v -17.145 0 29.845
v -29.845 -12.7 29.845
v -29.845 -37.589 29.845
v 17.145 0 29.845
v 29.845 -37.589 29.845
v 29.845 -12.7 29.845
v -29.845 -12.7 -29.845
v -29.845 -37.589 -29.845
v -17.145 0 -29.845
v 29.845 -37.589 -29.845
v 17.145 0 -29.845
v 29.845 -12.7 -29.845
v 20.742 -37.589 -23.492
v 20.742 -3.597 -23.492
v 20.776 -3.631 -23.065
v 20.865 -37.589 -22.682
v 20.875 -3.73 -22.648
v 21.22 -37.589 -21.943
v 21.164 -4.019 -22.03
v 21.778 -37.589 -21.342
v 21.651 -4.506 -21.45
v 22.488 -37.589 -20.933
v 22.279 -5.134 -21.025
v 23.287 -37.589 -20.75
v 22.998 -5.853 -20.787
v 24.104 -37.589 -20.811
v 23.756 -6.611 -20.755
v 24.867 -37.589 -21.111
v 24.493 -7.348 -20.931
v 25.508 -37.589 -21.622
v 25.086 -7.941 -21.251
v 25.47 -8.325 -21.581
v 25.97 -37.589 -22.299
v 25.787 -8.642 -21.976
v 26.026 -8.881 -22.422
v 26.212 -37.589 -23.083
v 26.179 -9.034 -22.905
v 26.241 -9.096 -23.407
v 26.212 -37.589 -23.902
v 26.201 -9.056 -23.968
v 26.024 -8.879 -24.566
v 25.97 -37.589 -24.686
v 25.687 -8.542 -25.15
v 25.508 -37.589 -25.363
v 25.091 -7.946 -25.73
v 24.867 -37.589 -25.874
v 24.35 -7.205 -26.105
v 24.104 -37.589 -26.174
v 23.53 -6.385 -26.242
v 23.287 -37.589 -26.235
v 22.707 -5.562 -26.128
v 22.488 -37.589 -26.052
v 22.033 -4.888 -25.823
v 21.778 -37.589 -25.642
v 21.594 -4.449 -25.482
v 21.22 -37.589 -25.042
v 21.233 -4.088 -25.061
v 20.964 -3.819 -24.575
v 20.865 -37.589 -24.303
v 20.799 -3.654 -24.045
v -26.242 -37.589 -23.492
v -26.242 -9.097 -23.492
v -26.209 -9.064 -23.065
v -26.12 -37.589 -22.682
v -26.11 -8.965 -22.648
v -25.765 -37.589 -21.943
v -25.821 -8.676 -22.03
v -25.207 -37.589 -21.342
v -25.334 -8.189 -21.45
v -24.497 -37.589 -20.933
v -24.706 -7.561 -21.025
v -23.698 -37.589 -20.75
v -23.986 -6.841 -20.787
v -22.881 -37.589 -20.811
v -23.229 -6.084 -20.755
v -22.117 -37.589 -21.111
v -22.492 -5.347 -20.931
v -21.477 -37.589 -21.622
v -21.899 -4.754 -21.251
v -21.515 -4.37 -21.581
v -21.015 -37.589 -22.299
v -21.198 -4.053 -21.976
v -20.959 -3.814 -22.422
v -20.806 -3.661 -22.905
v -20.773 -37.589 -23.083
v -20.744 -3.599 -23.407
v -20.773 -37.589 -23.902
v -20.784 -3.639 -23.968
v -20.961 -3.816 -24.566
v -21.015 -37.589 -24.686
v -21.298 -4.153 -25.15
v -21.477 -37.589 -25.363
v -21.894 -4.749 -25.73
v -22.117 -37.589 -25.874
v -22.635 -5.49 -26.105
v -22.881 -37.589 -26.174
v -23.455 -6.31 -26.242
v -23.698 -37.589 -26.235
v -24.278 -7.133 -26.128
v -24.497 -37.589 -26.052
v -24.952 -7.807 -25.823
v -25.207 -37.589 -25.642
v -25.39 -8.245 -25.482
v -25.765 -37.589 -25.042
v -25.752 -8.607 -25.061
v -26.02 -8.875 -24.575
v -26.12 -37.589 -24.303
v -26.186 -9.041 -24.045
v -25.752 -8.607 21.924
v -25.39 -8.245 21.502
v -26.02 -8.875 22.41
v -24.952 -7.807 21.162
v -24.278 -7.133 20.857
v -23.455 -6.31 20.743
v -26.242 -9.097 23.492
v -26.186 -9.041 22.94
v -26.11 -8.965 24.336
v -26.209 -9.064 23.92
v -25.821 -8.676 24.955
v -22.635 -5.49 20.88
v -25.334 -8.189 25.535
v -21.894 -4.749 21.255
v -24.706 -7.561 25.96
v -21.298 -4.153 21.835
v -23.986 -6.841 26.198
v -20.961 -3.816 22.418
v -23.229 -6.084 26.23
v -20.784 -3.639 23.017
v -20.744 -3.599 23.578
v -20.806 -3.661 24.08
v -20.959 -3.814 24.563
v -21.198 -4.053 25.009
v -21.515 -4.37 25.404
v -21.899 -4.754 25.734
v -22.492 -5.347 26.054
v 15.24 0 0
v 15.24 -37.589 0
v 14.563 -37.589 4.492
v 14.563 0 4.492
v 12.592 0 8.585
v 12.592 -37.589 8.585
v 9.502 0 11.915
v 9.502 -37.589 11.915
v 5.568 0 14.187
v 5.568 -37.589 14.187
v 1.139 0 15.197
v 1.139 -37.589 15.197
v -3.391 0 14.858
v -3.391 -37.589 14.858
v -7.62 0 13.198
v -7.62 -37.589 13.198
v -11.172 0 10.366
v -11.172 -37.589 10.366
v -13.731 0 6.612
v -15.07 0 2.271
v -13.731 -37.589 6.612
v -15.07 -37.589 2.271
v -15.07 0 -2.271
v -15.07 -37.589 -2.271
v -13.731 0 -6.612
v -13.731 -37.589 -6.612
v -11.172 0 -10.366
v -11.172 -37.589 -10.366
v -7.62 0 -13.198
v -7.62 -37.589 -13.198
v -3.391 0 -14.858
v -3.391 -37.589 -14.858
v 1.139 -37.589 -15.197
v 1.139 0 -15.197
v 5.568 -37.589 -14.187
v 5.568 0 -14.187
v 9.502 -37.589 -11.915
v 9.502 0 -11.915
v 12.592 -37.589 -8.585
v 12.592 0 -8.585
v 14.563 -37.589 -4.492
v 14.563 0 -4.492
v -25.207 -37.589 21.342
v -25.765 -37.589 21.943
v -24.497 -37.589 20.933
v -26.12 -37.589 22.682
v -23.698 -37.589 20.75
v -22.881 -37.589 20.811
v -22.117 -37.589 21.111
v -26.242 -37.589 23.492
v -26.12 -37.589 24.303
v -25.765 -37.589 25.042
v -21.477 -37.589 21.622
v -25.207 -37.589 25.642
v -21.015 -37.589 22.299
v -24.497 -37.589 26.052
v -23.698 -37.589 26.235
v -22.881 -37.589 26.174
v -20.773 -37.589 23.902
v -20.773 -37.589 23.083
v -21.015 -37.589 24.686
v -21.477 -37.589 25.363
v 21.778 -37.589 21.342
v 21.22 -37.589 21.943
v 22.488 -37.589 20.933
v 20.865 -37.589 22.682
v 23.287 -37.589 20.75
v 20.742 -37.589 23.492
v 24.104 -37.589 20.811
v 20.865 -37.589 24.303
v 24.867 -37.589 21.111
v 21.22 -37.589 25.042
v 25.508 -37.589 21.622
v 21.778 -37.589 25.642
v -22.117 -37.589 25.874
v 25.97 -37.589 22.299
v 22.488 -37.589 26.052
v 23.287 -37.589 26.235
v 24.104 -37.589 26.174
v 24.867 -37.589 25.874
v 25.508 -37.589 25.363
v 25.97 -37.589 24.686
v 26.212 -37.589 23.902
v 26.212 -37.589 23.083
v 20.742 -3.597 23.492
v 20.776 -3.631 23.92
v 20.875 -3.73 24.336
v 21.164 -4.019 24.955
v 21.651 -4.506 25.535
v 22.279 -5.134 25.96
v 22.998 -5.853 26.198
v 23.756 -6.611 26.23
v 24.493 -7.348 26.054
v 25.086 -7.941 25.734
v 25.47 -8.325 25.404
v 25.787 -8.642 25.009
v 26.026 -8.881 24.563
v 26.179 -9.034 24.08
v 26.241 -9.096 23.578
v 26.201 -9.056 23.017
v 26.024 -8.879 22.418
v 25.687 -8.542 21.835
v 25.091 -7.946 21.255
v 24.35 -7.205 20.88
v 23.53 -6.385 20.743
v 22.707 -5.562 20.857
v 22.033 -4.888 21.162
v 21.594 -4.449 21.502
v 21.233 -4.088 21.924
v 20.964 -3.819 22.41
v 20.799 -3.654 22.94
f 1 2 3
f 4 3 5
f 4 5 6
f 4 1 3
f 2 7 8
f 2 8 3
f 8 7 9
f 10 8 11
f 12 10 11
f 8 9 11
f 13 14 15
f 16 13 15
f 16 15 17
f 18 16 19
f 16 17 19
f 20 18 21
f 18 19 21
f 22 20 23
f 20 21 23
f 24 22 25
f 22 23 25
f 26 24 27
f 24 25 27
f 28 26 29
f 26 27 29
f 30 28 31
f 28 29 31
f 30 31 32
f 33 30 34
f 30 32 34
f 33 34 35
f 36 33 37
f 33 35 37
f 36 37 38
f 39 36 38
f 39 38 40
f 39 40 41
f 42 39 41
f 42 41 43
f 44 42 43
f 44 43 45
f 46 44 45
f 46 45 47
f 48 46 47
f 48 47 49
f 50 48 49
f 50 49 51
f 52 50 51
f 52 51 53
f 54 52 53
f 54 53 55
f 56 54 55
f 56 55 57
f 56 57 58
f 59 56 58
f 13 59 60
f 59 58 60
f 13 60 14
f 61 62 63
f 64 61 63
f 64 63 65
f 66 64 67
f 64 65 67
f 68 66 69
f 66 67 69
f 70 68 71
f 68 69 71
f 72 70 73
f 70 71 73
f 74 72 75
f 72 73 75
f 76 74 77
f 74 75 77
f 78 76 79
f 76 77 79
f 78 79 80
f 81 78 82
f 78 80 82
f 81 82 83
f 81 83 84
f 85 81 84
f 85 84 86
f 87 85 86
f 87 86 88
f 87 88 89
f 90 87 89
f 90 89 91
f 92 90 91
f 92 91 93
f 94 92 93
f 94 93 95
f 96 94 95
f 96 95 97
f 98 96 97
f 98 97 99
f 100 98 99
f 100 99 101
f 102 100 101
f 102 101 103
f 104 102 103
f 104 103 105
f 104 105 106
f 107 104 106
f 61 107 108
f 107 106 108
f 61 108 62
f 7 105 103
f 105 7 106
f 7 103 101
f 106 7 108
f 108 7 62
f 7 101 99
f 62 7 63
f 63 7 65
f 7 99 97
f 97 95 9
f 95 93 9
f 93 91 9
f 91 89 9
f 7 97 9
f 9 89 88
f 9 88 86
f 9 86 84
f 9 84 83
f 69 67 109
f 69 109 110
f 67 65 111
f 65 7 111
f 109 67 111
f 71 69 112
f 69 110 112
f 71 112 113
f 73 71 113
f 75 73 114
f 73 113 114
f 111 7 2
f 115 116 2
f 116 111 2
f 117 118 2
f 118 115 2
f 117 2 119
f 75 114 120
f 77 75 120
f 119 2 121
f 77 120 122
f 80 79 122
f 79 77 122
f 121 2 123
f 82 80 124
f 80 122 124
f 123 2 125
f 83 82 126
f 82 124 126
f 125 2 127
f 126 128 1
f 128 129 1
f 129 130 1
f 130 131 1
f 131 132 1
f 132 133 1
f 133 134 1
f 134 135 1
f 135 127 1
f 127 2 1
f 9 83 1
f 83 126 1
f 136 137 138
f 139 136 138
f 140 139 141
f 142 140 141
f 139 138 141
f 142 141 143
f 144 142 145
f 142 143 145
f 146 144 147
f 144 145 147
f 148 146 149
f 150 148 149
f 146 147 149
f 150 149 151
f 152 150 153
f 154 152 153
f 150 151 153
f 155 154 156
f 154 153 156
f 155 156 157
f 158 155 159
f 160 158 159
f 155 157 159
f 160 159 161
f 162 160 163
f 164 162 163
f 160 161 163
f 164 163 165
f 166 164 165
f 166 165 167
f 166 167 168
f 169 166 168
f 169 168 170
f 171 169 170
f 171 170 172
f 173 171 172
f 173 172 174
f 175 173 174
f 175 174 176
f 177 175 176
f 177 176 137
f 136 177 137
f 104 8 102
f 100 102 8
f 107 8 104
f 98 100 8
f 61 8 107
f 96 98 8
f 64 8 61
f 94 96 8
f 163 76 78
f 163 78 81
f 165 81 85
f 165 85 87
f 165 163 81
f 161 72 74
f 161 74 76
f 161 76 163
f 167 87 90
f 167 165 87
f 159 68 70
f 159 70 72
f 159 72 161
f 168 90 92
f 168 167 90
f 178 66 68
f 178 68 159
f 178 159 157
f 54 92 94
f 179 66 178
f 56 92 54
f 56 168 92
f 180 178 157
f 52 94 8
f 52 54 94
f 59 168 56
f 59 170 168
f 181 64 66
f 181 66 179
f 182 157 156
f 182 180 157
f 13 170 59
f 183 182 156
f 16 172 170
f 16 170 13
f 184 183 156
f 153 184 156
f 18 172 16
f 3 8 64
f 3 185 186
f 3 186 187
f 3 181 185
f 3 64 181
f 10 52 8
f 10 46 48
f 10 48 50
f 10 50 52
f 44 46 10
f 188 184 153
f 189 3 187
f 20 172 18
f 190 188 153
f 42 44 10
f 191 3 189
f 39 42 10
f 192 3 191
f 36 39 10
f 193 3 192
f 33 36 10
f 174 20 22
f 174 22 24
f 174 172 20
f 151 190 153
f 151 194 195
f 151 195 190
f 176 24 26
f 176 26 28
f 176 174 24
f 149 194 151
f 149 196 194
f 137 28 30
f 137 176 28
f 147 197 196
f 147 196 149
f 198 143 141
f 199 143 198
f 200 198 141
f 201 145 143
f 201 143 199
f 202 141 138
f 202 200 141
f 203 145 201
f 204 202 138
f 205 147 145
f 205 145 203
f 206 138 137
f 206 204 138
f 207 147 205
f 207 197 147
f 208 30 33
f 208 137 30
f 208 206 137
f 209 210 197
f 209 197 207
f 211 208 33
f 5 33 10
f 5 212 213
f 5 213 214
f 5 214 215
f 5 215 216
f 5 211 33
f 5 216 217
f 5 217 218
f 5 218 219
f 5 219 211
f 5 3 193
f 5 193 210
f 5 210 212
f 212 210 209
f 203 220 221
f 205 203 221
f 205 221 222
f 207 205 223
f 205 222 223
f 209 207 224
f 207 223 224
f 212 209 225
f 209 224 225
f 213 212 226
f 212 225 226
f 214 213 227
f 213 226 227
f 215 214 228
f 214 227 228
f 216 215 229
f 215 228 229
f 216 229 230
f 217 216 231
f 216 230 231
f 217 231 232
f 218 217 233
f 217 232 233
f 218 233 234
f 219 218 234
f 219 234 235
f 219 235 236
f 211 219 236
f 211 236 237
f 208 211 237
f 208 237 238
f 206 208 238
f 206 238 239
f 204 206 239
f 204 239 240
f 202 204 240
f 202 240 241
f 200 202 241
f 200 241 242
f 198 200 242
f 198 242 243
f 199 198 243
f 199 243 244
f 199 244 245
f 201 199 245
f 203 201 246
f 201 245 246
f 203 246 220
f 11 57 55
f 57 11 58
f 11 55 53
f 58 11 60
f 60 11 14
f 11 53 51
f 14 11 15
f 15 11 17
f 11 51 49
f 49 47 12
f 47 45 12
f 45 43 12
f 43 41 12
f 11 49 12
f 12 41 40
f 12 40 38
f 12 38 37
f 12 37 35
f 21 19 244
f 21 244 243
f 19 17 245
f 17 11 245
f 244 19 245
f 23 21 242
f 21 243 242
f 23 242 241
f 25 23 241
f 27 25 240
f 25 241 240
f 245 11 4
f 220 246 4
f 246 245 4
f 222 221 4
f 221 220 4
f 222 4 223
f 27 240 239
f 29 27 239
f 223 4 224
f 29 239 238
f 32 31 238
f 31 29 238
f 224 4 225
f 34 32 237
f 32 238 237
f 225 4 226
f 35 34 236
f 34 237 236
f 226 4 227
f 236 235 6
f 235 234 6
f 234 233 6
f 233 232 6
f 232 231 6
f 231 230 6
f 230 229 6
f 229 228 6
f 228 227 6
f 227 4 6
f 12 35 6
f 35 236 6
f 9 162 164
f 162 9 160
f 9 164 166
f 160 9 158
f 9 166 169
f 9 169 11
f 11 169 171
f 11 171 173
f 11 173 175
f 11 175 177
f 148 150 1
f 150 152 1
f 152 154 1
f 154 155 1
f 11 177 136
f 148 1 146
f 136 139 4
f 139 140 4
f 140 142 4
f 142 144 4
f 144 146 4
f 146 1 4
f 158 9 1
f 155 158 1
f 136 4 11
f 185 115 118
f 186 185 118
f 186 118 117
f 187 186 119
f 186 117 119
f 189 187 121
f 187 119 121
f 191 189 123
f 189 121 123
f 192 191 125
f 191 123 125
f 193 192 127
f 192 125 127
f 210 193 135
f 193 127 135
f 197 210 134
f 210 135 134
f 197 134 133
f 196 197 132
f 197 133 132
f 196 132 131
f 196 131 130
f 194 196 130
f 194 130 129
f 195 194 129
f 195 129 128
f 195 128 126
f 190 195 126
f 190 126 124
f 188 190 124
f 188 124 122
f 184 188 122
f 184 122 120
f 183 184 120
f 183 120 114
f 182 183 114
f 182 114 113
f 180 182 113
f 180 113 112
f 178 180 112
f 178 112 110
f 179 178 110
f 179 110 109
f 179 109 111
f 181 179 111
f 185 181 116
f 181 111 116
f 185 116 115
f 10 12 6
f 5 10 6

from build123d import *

# Parameters (mm, degrees)
F0_W     = 59.69
F0_H     = 59.69
F1_DEPTH = 37.58946
F2_R     = 15.24
F3_DEPTH = 37.59046
F5_DEPTH = 59.691
F7_D     = 5.5


with BuildPart() as f1:
    # F0 (on Front) → F1 (new body)
    with BuildSketch(Plane.XZ):
        Rectangle(F0_W, F0_H)
    extrude(amount=F1_DEPTH)

    # F2 (on face) → F3 (cut, through all)
    with BuildSketch(Plane.XZ.offset(37.58946)):
        Circle(F2_R)
    extrude(amount=-F3_DEPTH, mode=Mode.SUBTRACT)

    # F4 (on face) → F5 (cut, through all)
    with BuildSketch(Plane.XY.offset(29.845)):
        Polygon((-29.845, -12.7), (-17.145, 0), (-29.845, 0), align=None)
        Polygon((29.845, -12.7), (29.845, 0), (17.145, 0), align=None)
    extrude(amount=-F5_DEPTH, mode=Mode.SUBTRACT)

    # F7 (through all)
    with Locations(Plane.XZ.offset(37.58946)):
        with Locations((-23.49246, 23.49246), (23.49246, 23.49246), (23.49246, -23.49246), (-23.49246, -23.49246)):
            Hole(F7_D / 2)


solid = f1.part
